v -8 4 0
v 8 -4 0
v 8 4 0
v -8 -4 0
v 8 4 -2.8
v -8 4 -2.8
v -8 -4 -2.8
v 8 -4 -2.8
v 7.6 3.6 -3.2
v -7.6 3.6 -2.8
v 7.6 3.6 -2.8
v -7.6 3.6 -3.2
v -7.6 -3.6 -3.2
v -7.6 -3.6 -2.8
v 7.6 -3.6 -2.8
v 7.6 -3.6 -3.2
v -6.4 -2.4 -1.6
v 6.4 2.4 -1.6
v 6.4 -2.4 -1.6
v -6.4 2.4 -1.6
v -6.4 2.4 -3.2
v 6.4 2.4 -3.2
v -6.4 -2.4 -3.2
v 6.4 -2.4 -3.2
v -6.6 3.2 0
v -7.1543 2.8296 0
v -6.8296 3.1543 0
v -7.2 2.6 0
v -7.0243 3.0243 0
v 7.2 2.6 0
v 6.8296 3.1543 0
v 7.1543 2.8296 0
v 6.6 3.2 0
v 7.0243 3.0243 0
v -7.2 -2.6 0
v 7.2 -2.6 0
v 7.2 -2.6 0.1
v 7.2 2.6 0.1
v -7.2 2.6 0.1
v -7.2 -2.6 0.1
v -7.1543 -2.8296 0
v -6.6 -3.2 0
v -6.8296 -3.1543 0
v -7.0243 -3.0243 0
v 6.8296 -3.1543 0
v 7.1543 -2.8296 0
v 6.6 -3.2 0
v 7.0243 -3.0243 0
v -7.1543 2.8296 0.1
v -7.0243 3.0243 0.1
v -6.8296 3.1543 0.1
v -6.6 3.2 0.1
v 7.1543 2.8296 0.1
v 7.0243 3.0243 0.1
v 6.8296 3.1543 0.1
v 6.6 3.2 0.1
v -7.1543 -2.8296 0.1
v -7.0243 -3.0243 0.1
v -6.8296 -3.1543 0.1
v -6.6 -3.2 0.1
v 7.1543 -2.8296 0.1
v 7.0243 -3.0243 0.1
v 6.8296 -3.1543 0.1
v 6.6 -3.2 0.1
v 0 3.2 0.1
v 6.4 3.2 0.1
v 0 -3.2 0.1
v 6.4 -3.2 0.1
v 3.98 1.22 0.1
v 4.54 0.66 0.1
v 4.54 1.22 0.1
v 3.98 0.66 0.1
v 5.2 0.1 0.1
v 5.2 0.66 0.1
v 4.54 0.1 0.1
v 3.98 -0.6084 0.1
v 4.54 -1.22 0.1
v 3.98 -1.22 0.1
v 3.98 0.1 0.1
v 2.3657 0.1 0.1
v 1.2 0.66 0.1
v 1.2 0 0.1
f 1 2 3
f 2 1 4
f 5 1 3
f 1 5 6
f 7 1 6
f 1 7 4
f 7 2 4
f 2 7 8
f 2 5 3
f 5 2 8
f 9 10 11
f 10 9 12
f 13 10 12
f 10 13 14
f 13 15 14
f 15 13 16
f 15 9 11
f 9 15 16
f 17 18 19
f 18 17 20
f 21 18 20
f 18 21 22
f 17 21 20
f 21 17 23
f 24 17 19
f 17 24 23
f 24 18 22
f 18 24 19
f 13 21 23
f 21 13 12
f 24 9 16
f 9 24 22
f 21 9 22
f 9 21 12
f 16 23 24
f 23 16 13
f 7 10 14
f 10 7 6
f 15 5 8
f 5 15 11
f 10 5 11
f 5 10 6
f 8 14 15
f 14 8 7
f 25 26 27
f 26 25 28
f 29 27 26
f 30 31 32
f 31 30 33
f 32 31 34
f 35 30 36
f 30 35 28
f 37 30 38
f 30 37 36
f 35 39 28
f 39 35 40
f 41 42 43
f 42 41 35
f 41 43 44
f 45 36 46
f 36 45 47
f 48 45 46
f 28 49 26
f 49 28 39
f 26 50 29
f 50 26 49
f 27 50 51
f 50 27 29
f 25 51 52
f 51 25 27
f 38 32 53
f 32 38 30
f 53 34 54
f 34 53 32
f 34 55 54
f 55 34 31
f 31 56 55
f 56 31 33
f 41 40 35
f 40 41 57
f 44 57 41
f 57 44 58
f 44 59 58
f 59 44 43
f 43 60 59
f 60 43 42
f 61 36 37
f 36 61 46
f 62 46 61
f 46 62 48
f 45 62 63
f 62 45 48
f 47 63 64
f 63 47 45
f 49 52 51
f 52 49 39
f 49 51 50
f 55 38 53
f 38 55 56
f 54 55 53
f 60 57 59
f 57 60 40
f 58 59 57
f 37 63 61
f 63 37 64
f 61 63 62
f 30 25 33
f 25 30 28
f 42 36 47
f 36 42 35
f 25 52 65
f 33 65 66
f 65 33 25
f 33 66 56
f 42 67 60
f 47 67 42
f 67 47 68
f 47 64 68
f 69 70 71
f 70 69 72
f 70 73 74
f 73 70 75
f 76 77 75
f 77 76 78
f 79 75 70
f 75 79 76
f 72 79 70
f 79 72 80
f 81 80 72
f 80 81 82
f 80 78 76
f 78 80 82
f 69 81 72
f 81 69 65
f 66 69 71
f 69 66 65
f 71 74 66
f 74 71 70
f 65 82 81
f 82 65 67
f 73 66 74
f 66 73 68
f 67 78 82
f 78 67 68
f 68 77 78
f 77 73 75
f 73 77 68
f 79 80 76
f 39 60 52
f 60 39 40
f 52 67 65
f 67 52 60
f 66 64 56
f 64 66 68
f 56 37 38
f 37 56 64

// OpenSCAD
// file: ../p/box5.scad
use <../lib.scad>
function ldraw_lib__box5() = [
// 0 Box with 5 Faces and All Edges
// 0 Name: box5.dat
// 0 Author: James Jessiman
// 0 !LDRAW_ORG Primitive UPDATE 2012-01
// 0 !LICENSE Licensed under CC BY 4.0 : see CAreadme.txt
// 
// 0 BFC CERTIFY CCW
  [0,"BFC","CERTIFY"],
  [0,"BFC","CCW"],
// 
// 0 !HISTORY 2002-04-03 [sbliss] Modified for BFC compliance
// 0 !HISTORY 2002-04-25 [PTadmin] Official Update 2002-02
// 0 !HISTORY 2007-06-24 [PTadmin] Header formatted for Contributor Agreement
// 0 !HISTORY 2008-07-01 [PTadmin] Official Update 2008-01
// 0 !HISTORY 2012-02-16 [Philo] Changed to CCW
// 0 !HISTORY 2012-03-30 [PTadmin] Official Update 2012-01
// 
// 
// 2 24 1 1 1 -1 1 1
  [2,24,1,1,1,-1,1,1],
// 2 24 -1 1 1 -1 1 -1
  [2,24,-1,1,1,-1,1,-1],
// 2 24 -1 1 -1 1 1 -1
  [2,24,-1,1,-1,1,1,-1],
// 2 24 1 1 -1 1 1 1
  [2,24,1,1,-1,1,1,1],
// 2 24 1 0 1 -1 0 1
  [2,24,1,0,1,-1,0,1],
// 2 24 -1 0 1 -1 0 -1
  [2,24,-1,0,1,-1,0,-1],
// 2 24 -1 0 -1 1 0 -1
  [2,24,-1,0,-1,1,0,-1],
// 2 24 1 0 -1 1 0 1
  [2,24,1,0,-1,1,0,1],
// 2 24 1 0 1 1 1 1
  [2,24,1,0,1,1,1,1],
// 2 24 -1 0 1 -1 1 1
  [2,24,-1,0,1,-1,1,1],
// 2 24 1 0 -1 1 1 -1
  [2,24,1,0,-1,1,1,-1],
// 2 24 -1 0 -1 -1 1 -1
  [2,24,-1,0,-1,-1,1,-1],
// 4 16 -1 1 1 1 1 1 1 1 -1 -1 1 -1
  [4,16,-1,1,1,1,1,1,1,1,-1,-1,1,-1],
// 4 16 -1 1 1 -1 0 1 1 0 1 1 1 1
  [4,16,-1,1,1,-1,0,1,1,0,1,1,1,1],
// 4 16 -1 1 -1 -1 0 -1 -1 0 1 -1 1 1
  [4,16,-1,1,-1,-1,0,-1,-1,0,1,-1,1,1],
// 4 16 1 1 -1 1 0 -1 -1 0 -1 -1 1 -1
  [4,16,1,1,-1,1,0,-1,-1,0,-1,-1,1,-1],
// 4 16 1 1 1 1 0 1 1 0 -1 1 1 -1
  [4,16,1,1,1,1,0,1,1,0,-1,1,1,-1],
];
module ldraw_lib__box5(step=0, col=false, unit=2/5, alt=false, line=0.2, solid=!$preview)
    makepoly(ldraw_lib__box5(), step=step, col=col, unit=unit, alt=alt, line=line, solid=solid);
ldraw_lib__box5(line=0.2);
// file: ../p/box4.scad
use <../lib.scad>
function ldraw_lib__box4() = [
// 0 Box with 4 Faces (2 Parallel Pairs) and All Edges
// 0 Name: box4.dat
// 0 Author: James Jessiman
// 0 !LDRAW_ORG Primitive UPDATE 2012-01
// 0 !LICENSE Licensed under CC BY 4.0 : see CAreadme.txt
// 
// 0 BFC CERTIFY CCW
  [0,"BFC","CERTIFY"],
  [0,"BFC","CCW"],
// 
// 0 !HISTORY 2002-04-03 [sbliss] Modified for BFC compliance
// 0 !HISTORY 2002-04-25 [PTadmin] Official Update 2002-02
// 0 !HISTORY 2007-06-24 [PTadmin] Header formatted for Contributor Agreement
// 0 !HISTORY 2008-07-01 [PTadmin] Official Update 2008-01
// 0 !HISTORY 2012-02-16 [Philo] Changed to CCW
// 0 !HISTORY 2012-03-30 [PTadmin] Official Update 2012-01
// 
// 
// 2 24 1 1 1 -1 1 1
  [2,24,1,1,1,-1,1,1],
// 2 24 -1 1 1 -1 1 -1
  [2,24,-1,1,1,-1,1,-1],
// 2 24 -1 1 -1 1 1 -1
  [2,24,-1,1,-1,1,1,-1],
// 2 24 1 1 -1 1 1 1
  [2,24,1,1,-1,1,1,1],
// 2 24 1 0 1 -1 0 1
  [2,24,1,0,1,-1,0,1],
// 2 24 -1 0 1 -1 0 -1
  [2,24,-1,0,1,-1,0,-1],
// 2 24 -1 0 -1 1 0 -1
  [2,24,-1,0,-1,1,0,-1],
// 2 24 1 0 -1 1 0 1
  [2,24,1,0,-1,1,0,1],
// 2 24 1 0 1 1 1 1
  [2,24,1,0,1,1,1,1],
// 2 24 -1 0 1 -1 1 1
  [2,24,-1,0,1,-1,1,1],
// 2 24 1 0 -1 1 1 -1
  [2,24,1,0,-1,1,1,-1],
// 2 24 -1 0 -1 -1 1 -1
  [2,24,-1,0,-1,-1,1,-1],
// 4 16 -1 1 1 -1 0 1 1 0 1 1 1 1
  [4,16,-1,1,1,-1,0,1,1,0,1,1,1,1],
// 4 16 -1 1 -1 -1 0 -1 -1 0 1 -1 1 1
  [4,16,-1,1,-1,-1,0,-1,-1,0,1,-1,1,1],
// 4 16 1 1 -1 1 0 -1 -1 0 -1 -1 1 -1
  [4,16,1,1,-1,1,0,-1,-1,0,-1,-1,1,-1],
// 4 16 1 1 1 1 0 1 1 0 -1 1 1 -1
  [4,16,1,1,1,1,0,1,1,0,-1,1,1,-1],
];
module ldraw_lib__box4(step=0, col=false, unit=2/5, alt=false, line=0.2, solid=!$preview)
    makepoly(ldraw_lib__box4(), step=step, col=col, unit=unit, alt=alt, line=line, solid=solid);
ldraw_lib__box4(line=0.2);
// file: ../p/box3u12.scad
use <../lib.scad>
function ldraw_lib__box3u12() = [
// 0 Box with 3 Parallel Faces without Any Edges
// 0 Name: box3u12.dat
// 0 Author: J.C. Tchang [tchang]
// 0 !LDRAW_ORG Primitive UPDATE 2014-02
// 0 !LICENSE Licensed under CC BY 4.0 : see CAreadme.txt
// 
// 0 BFC CERTIFY CCW
  [0,"BFC","CERTIFY"],
  [0,"BFC","CCW"],
// 
// 0 !HISTORY 2014-12-23 [PTadmin] Official Update 2014-02
// 
// 
// 4 16 -1 1 1 1 1 1 1 1 -1 -1 1 -1
  [4,16,-1,1,1,1,1,1,1,1,-1,-1,1,-1],
// 4 16 -1 1 1 -1 0 1 1 0 1 1 1 1
  [4,16,-1,1,1,-1,0,1,1,0,1,1,1,1],
// 4 16 1 1 -1 1 0 -1 -1 0 -1 -1 1 -1
  [4,16,1,1,-1,1,0,-1,-1,0,-1,-1,1,-1],
];
module ldraw_lib__box3u12(step=0, col=false, unit=2/5, alt=false, line=0.2, solid=!$preview)
    makepoly(ldraw_lib__box3u12(), step=step, col=col, unit=unit, alt=alt, line=line, solid=solid);
ldraw_lib__box3u12(line=0.2);
// file: ../p/1-4cyli.scad
use <../lib.scad>
function ldraw_lib__1_4cyli() = [
// 0 Cylinder 0.25
// 0 Name: 1-4cyli.dat
// 0 Author: James Jessiman
// 0 !LDRAW_ORG Primitive UPDATE 2012-01
// 0 !LICENSE Licensed under CC BY 4.0 : see CAreadme.txt
// 
// 0 BFC CERTIFY CCW
  [0,"BFC","CERTIFY"],
  [0,"BFC","CCW"],
// 
// 0 !HISTORY 2002-03-23 [sbliss] Added BFC statement.
// 0 !HISTORY 2002-04-25 [PTadmin] Official Update 2002-02
// 0 !HISTORY 2007-06-22 [PTadmin] Header formatted for Contributor Agreement
// 0 !HISTORY 2008-07-01 [PTadmin] Official Update 2008-01
// 0 !HISTORY 2012-02-16 [Philo] Changed to CCW
// 0 !HISTORY 2012-03-30 [PTadmin] Official Update 2012-01
// 
// 
// 4 16 1 1 0 0.9239 1 0.3827 0.9239 0 0.3827 1 0 0
  [4,16,1,1,0,0.9239,1,0.3827,0.9239,0,0.3827,1,0,0],
// 5 24 1 0 0 1 1 0 0.9239 0 0.3827 1 0 -1
  [5,24,1,0,0,1,1,0,0.9239,0,0.3827,1,0,-1],
// 4 16 0.9239 1 0.3827 0.7071 1 0.7071 0.7071 0 0.7071 0.9239 0 0.3827
  [4,16,0.9239,1,0.3827,0.7071,1,0.7071,0.7071,0,0.7071,0.9239,0,0.3827],
// 5 24 0.9239 0 0.3827 0.9239 1 0.3827 0.7071 0 0.7071 1 0 0
  [5,24,0.9239,0,0.3827,0.9239,1,0.3827,0.7071,0,0.7071,1,0,0],
// 4 16 0.7071 1 0.7071 0.3827 1 0.9239 0.3827 0 0.9239 0.7071 0 0.7071
  [4,16,0.7071,1,0.7071,0.3827,1,0.9239,0.3827,0,0.9239,0.7071,0,0.7071],
// 5 24 0.7071 0 0.7071 0.7071 1 0.7071 0.3827 0 0.9239 0.9239 0 0.3827
  [5,24,0.7071,0,0.7071,0.7071,1,0.7071,0.3827,0,0.9239,0.9239,0,0.3827],
// 4 16 0.3827 1 0.9239 0 1 1 0 0 1 0.3827 0 0.9239
  [4,16,0.3827,1,0.9239,0,1,1,0,0,1,0.3827,0,0.9239],
// 5 24 0.3827 0 0.9239 0.3827 1 0.9239 0 0 1 0.7071 0 0.7071
  [5,24,0.3827,0,0.9239,0.3827,1,0.9239,0,0,1,0.7071,0,0.7071],
// 5 24 0 0 1 0 1 1 0.3827 0 0.9239 -1 0 1
  [5,24,0,0,1,0,1,1,0.3827,0,0.9239,-1,0,1],
];
module ldraw_lib__1_4cyli(step=0, col=false, unit=2/5, alt=false, line=0.2, solid=!$preview)
    makepoly(ldraw_lib__1_4cyli(), step=step, col=col, unit=unit, alt=alt, line=line, solid=solid);
ldraw_lib__1_4cyli(line=0.2);
// file: ../p/1-4chrd.scad
use <../lib.scad>
function ldraw_lib__1_4chrd() = [
// 0 Chord 0.25
// 0 Name: 1-4chrd.dat
// 0 Author: Max Martin Richter [MMR1988]
// 0 !LDRAW_ORG Primitive UPDATE 2023-05
// 0 !LICENSE Licensed under CC BY 4.0 : see CAreadme.txt
// 
// 0 BFC CERTIFY CCW
  [0,"BFC","CERTIFY"],
  [0,"BFC","CCW"],
// 
// 0 !HISTORY 2004-04-22 [PTadmin] Official Update 2004-02
// 0 !HISTORY 2007-10-09 [PTadmin] Header formatted for Contributor Agreement
// 0 !HISTORY 2008-07-01 [PTadmin] Official Update 2008-01
// 0 !HISTORY 2012-08-02 [MMR1988] Re-creation with PrimGen2 and Rectifier
// 0 !HISTORY 2012-08-09 [PTadmin] Official Update 2012-02
// 0 !HISTORY 2023-10-27 [OrionP] Change author to MMR1988 from hafhead
// 0 !HISTORY 2023-10-31 [OrionP] Official Update 2023-05
// 
// 4 16 0.9239 0 0.3827 0.3827 0 0.9239 0 0 1 1 0 0
  [4,16,0.9239,0,0.3827,0.3827,0,0.9239,0,0,1,1,0,0],
// 3 16 0.7071 0 0.7071 0.3827 0 0.9239 0.9239 0 0.3827
  [3,16,0.7071,0,0.7071,0.3827,0,0.9239,0.9239,0,0.3827],
];
module ldraw_lib__1_4chrd(step=0, col=false, unit=2/5, alt=false, line=0.2, solid=!$preview)
    makepoly(ldraw_lib__1_4chrd(), step=step, col=col, unit=unit, alt=alt, line=line, solid=solid);
ldraw_lib__1_4chrd(line=0.2);
// file: s/3069bs01.scad
use <../../lib.scad>
use <../../p/box4.scad>
use <../../p/box5.scad>
function ldraw_lib__s__3069bs01() = [
// 0 ~Tile  1 x  2 with Groove without Top Face
// 0 Name: s\3069bs01.dat
// 0 Author: Santeri Piippo [arezey]
// 0 !LDRAW_ORG Subpart UPDATE 2010-02
// 0 !LICENSE Licensed under CC BY 4.0 : see CAreadme.txt
// 
// 0 BFC CERTIFY CCW
  [0,"BFC","CERTIFY"],
  [0,"BFC","CCW"],
// 
// 0 !HISTORY 2010-07-05 [PTadmin] Official Update 2010-02
// 
// 
// 1 16 0 0 0 20 0 0 0 7 0 0 0 10 box4.dat
  [1,16,0,0,0,20,0,0,0,7,0,0,0,10, ldraw_lib__box4()],
// 1 16 0 7 0 19 0 0 0 1 0 0 0 9 box4.dat
  [1,16,0,7,0,19,0,0,0,1,0,0,0,9, ldraw_lib__box4()],
// 0 BFC INVERTNEXT
  [0,"BFC","INVERTNEXT"],
// 1 16 0 8 0 16 0 0 0 -4 0 0 0 6 box5.dat
  [1,16,0,8,0,16,0,0,0,-4,0,0,0,6, ldraw_lib__box5()],
// 4 16 -19 8 9 -16 8 6 -16 8 -6 -19 8 -9
  [4,16,-19,8,9,-16,8,6,-16,8,-6,-19,8,-9],
// 4 16 19 8 -9 16 8 -6 16 8 6 19 8 9
  [4,16,19,8,-9,16,8,-6,16,8,6,19,8,9],
// 4 16 19 8 9 16 8 6 -16 8 6 -19 8 9
  [4,16,19,8,9,16,8,6,-16,8,6,-19,8,9],
// 4 16 -19 8 -9 -16 8 -6 16 8 -6 19 8 -9
  [4,16,-19,8,-9,-16,8,-6,16,8,-6,19,8,-9],
// 4 16 -20 7 10 -19 7 9 -19 7 -9 -20 7 -10
  [4,16,-20,7,10,-19,7,9,-19,7,-9,-20,7,-10],
// 4 16 20 7 -10 19 7 -9 19 7 9 20 7 10
  [4,16,20,7,-10,19,7,-9,19,7,9,20,7,10],
// 4 16 20 7 10 19 7 9 -19 7 9 -20 7 10
  [4,16,20,7,10,19,7,9,-19,7,9,-20,7,10],
// 4 16 -20 7 -10 -19 7 -9 19 7 -9 20 7 -10
  [4,16,-20,7,-10,-19,7,-9,19,7,-9,20,7,-10],
// 0 //
];
module ldraw_lib__s__3069bs01(step=0, col=false, unit=2/5, alt=false, line=0.2, solid=!$preview)
    makepoly(ldraw_lib__s__3069bs01(), step=step, col=col, unit=unit, alt=alt, line=line, solid=solid);
ldraw_lib__s__3069bs01(line=0.2);
// file: 6142271o.scad
use <../lib.scad>
use <../p/1-4chrd.scad>
use <../p/1-4cyli.scad>
use <../p/box3u12.scad>
function ldraw_lib__6142271o() = [
// 0 Sticker  1.8 x  .8 with Black 4 on White Stripe on Blue Background
// 0 Name: 6142271o.dat
// 0 Author: Massimo Maso [Sirio]
// 0 !LDRAW_ORG Part UPDATE 2025-02
// 0 !LICENSE Licensed under CC BY 4.0 : see CAreadme.txt
// 
// 0 BFC CERTIFY CCW
  [0,"BFC","CERTIFY"],
  [0,"BFC","CCW"],
// 
// 0 !KEYWORDS Audi, Bricklink 75873stk01a, Brickowl 427960, LMS, R8
// 0 !KEYWORDS Rebrickable 24755, Set 75873, Speed Champions, Ultra
// 
// 0 !HISTORY 2025-02-27 [OrionP] Official Update 2025-02
// 
// 
// 0 // Primitives
// 1 16 6.5 0 16.5 0 0 1.5 0 -1 0 1.5 0 0 1-4chrd.dat
  [1,16,6.5,0,16.5,0,0,1.5,0,-1,0,1.5,0,0, ldraw_lib__1_4chrd()],
// 1 16 6.5 0 -16.5 0 0 1.5 0 -1 0 -1.5 0 0 1-4chrd.dat
  [1,16,6.5,0,-16.5,0,0,1.5,0,-1,0,-1.5,0,0, ldraw_lib__1_4chrd()],
// 1 16 0 -.25 0 6.5 0 0 0 .25 0 0 0 -18 box3u12.dat
  [1,16,0,-.25,0,6.5,0,0,0,.25,0,0,0,-18, ldraw_lib__box3u12()],
// 1 16 -6.5 0 16.5 0 0 -1.5 0 -1 0 1.5 0 0 1-4chrd.dat
  [1,16,-6.5,0,16.5,0,0,-1.5,0,-1,0,1.5,0,0, ldraw_lib__1_4chrd()],
// 1 16 -6.5 0 -16.5 0 0 -1.5 0 -1 0 -1.5 0 0 1-4chrd.dat
  [1,16,-6.5,0,-16.5,0,0,-1.5,0,-1,0,-1.5,0,0, ldraw_lib__1_4chrd()],
// 1 16 6.5 0 16.5 0 0 1.5 0 -.25 0 1.5 0 0 1-4cyli.dat
  [1,16,6.5,0,16.5,0,0,1.5,0,-.25,0,1.5,0,0, ldraw_lib__1_4cyli()],
// 1 16 6.5 0 -16.5 0 0 1.5 0 -.25 0 -1.5 0 0 1-4cyli.dat
  [1,16,6.5,0,-16.5,0,0,1.5,0,-.25,0,-1.5,0,0, ldraw_lib__1_4cyli()],
// 1 16 -6.5 0 16.5 0 0 -1.5 0 -.25 0 1.5 0 0 1-4cyli.dat
  [1,16,-6.5,0,16.5,0,0,-1.5,0,-.25,0,1.5,0,0, ldraw_lib__1_4cyli()],
// 1 16 -6.5 0 -16.5 0 0 -1.5 0 -.25 0 -1.5 0 0 1-4cyli.dat
  [1,16,-6.5,0,-16.5,0,0,-1.5,0,-.25,0,-1.5,0,0, ldraw_lib__1_4cyli()],
// 1 1 6.5 -.25 16.5 0 0 1.5 0 1 0 1.5 0 0 1-4chrd.dat
  [1,1,6.5,-.25,16.5,0,0,1.5,0,1,0,1.5,0,0, ldraw_lib__1_4chrd()],
// 1 1 6.5 -.25 -16.5 0 0 1.5 0 1 0 -1.5 0 0 1-4chrd.dat
  [1,1,6.5,-.25,-16.5,0,0,1.5,0,1,0,-1.5,0,0, ldraw_lib__1_4chrd()],
// 1 1 -6.5 -.25 16.5 0 0 -1.5 0 1 0 1.5 0 0 1-4chrd.dat
  [1,1,-6.5,-.25,16.5,0,0,-1.5,0,1,0,1.5,0,0, ldraw_lib__1_4chrd()],
// 1 1 -6.5 -.25 -16.5 0 0 -1.5 0 1 0 -1.5 0 0 1-4chrd.dat
  [1,1,-6.5,-.25,-16.5,0,0,-1.5,0,1,0,-1.5,0,0, ldraw_lib__1_4chrd()],
// 0 // Bottom faces
// 4 16 8 0 -16.5 6.5 0 -18 6.5 0 18 8 0 16.5
  [4,16,8,0,-16.5,6.5,0,-18,6.5,0,18,8,0,16.5],
// 4 16 -8 0 -16.5 -8 0 16.5 -6.5 0 18 -6.5 0 -18
  [4,16,-8,0,-16.5,-8,0,16.5,-6.5,0,18,-6.5,0,-18],
// 0 // Lateral faces
// 3 16 8 0 16.5 8 -.25 16.5 8 -.25 0
  [3,16,8,0,16.5,8,-.25,16.5,8,-.25,0],
// 4 16 8 0 16.5 8 -.25 0 8 -.25 -16 8 0 -16.5
  [4,16,8,0,16.5,8,-.25,0,8,-.25,-16,8,0,-16.5],
// 3 16 8 0 -16.5 8 -.25 -16 8 -.25 -16.5
  [3,16,8,0,-16.5,8,-.25,-16,8,-.25,-16.5],
// 3 16 -8 0 16.5 -8 -.25 0 -8 -.25 16.5
  [3,16,-8,0,16.5,-8,-.25,0,-8,-.25,16.5],
// 4 16 -8 0 16.5 -8 0 -16.5 -8 -.25 -16 -8 -.25 0
  [4,16,-8,0,16.5,-8,0,-16.5,-8,-.25,-16,-8,-.25,0],
// 3 16 -8 0 -16.5 -8 -.25 -16.5 -8 -.25 -16
  [3,16,-8,0,-16.5,-8,-.25,-16.5,-8,-.25,-16],
// 0 // Black number 4
// 4 0 3.05 -.25 -9.95 1.65 -.25 -9.95 1.65 -.25 -11.35 3.05 -.25 -11.35
  [4,0,3.05,-.25,-9.95,1.65,-.25,-9.95,1.65,-.25,-11.35,3.05,-.25,-11.35],
// 4 0 1.65 -.25 -11.35 .25 -.25 -11.35 .25 -.25 -13 1.65 -.25 -13
  [4,0,1.65,-.25,-11.35,.25,-.25,-11.35,.25,-.25,-13,1.65,-.25,-13],
// 4 0 .25 -.25 -11.35 -1.5211 -.25 -9.95 -3.05 -.25 -9.95 -3.05 -.25 -11.35
  [4,0,.25,-.25,-11.35,-1.5211,-.25,-9.95,-3.05,-.25,-9.95,-3.05,-.25,-11.35],
// 4 0 1.65 -.25 -11.35 .25 -.25 -9.95 -1.5211 -.25 -9.95 .25 -.25 -11.35
  [4,0,1.65,-.25,-11.35,.25,-.25,-9.95,-1.5211,-.25,-9.95,.25,-.25,-11.35],
// 4 0 1.65 -.25 -9.95 .25 -.25 -5.9142 .25 -.25 -9.95 1.65 -.25 -11.35
  [4,0,1.65,-.25,-9.95,.25,-.25,-5.9142,.25,-.25,-9.95,1.65,-.25,-11.35],
// 4 0 1.65 -.25 -9.95 1.65 -.25 -3 0 -.25 -3 .25 -.25 -5.9142
  [4,0,1.65,-.25,-9.95,1.65,-.25,-3,0,-.25,-3,.25,-.25,-5.9142],
// 4 0 .25 -.25 -5.9142 0 -.25 -3 -3.05 -.25 -9.95 -1.5211 -.25 -9.95
  [4,0,.25,-.25,-5.9142,0,-.25,-3,-3.05,-.25,-9.95,-1.5211,-.25,-9.95],
// 0 // White top faces
// 4 15 8 -.25 0 1.65 -.25 -3 1.65 -.25 -9.95 3.05 -.25 -9.95
  [4,15,8,-.25,0,1.65,-.25,-3,1.65,-.25,-9.95,3.05,-.25,-9.95],
// 4 15 8 -.25 0 3.05 -.25 -9.95 3.05 -.25 -11.35 8 -.25 -16
  [4,15,8,-.25,0,3.05,-.25,-9.95,3.05,-.25,-11.35,8,-.25,-16],
// 4 15 8 -.25 -16 3.05 -.25 -11.35 1.65 -.25 -11.35 1.65 -.25 -13
  [4,15,8,-.25,-16,3.05,-.25,-11.35,1.65,-.25,-11.35,1.65,-.25,-13],
// 4 15 8 -.25 0 -8 -.25 0 0 -.25 -3 1.65 -.25 -3
  [4,15,8,-.25,0,-8,-.25,0,0,-.25,-3,1.65,-.25,-3],
// 4 15 8 -.25 -16 1.65 -.25 -13 .25 -.25 -13 -8 -.25 -16
  [4,15,8,-.25,-16,1.65,-.25,-13,.25,-.25,-13,-8,-.25,-16],
// 4 15 -8 -.25 0 -8 -.25 -16 -3.05 -.25 -9.95 0 -.25 -3
  [4,15,-8,-.25,0,-8,-.25,-16,-3.05,-.25,-9.95,0,-.25,-3],
// 3 15 -8 -.25 -16 -3.05 -.25 -11.35 -3.05 -.25 -9.95
  [3,15,-8,-.25,-16,-3.05,-.25,-11.35,-3.05,-.25,-9.95],
// 4 15 -8 -.25 -16 .25 -.25 -13 .25 -.25 -11.35 -3.05 -.25 -11.35
  [4,15,-8,-.25,-16,.25,-.25,-13,.25,-.25,-11.35,-3.05,-.25,-11.35],
// 3 15 .25 -.25 -9.95 .25 -.25 -5.9142 -1.5211 -.25 -9.95
  [3,15,.25,-.25,-9.95,.25,-.25,-5.9142,-1.5211,-.25,-9.95],
// 0 // Blue top faces
// 4 1 8 -.25 16.5 6.5 -.25 18 -6.5 -.25 18 -8 -.25 16.5
  [4,1,8,-.25,16.5,6.5,-.25,18,-6.5,-.25,18,-8,-.25,16.5],
// 4 1 8 -.25 16.5 -8 -.25 16.5 -8 -.25 0 8 -.25 0
  [4,1,8,-.25,16.5,-8,-.25,16.5,-8,-.25,0,8,-.25,0],
// 4 1 8 -.25 -16 -8 -.25 -16 -8 -.25 -16.5 8 -.25 -16.5
  [4,1,8,-.25,-16,-8,-.25,-16,-8,-.25,-16.5,8,-.25,-16.5],
// 4 1 8 -.25 -16.5 -8 -.25 -16.5 -6.5 -.25 -18 6.5 -.25 -18
  [4,1,8,-.25,-16.5,-8,-.25,-16.5,-6.5,-.25,-18,6.5,-.25,-18],
];
module ldraw_lib__6142271o(step=0, col=false, unit=2/5, alt=false, line=0.2, solid=!$preview)
    makepoly(ldraw_lib__6142271o(), step=step, col=col, unit=unit, alt=alt, line=line, solid=solid);
ldraw_lib__6142271o(line=0.2);
// file: 3069b.scad
use <../lib.scad>
use <s/3069bs01.scad>
function ldraw_lib__3069b() = [
// 0 Tile  1 x  2 with Groove
// 0 Name: 3069b.dat
// 0 Author: Santeri Piippo [arezey]
// 0 !LDRAW_ORG Part UPDATE 2010-02
// 0 !LICENSE Licensed under CC BY 4.0 : see CAreadme.txt
// 
// 0 BFC CERTIFY CCW
  [0,"BFC","CERTIFY"],
  [0,"BFC","CCW"],
// 
// 0 !HISTORY 2010-07-05 [PTadmin] Official Update 2010-02
// 
// 
// 4 16 20 0 -10 20 0 10 -20 0 10 -20 0 -10
  [4,16,20,0,-10,20,0,10,-20,0,10,-20,0,-10],
// 1 16 0 0 0 1 0 0 0 1 0 0 0 1 s\3069bs01.dat
  [1,16,0,0,0,1,0,0,0,1,0,0,0,1, ldraw_lib__s__3069bs01()],
// 0 //
];
module ldraw_lib__3069b(step=0, col=false, unit=2/5, alt=false, line=0.2, solid=!$preview)
    makepoly(ldraw_lib__3069b(), step=step, col=col, unit=unit, alt=alt, line=line, solid=solid);
ldraw_lib__3069b(line=0.2);
// main file
use <../lib.scad>
use <3069b.scad>
use <6142271o.scad>
function ldraw_lib__3069bd1k() = [
// 0 Tile  1 x  2 with Black 4 on White Stripe on Blue Background Sticker
// 0 Name: 3069bd1k.dat
// 0 Author: Vincent Messenet [Cheenzo]
// 0 !LDRAW_ORG Shortcut UPDATE 2025-03
// 0 !LICENSE Licensed under CC BY 4.0 : see CAreadme.txt
// 
// 0 BFC CERTIFY CCW
  [0,"BFC","CERTIFY"],
  [0,"BFC","CCW"],
// 
// 0 !CATEGORY Sticker Shortcut
// 0 !KEYWORDS Audi R8 LMS ultra, Bricklink 3069pb0646, Set 75873
// 
// 0 !HISTORY 2025-03-30 [OrionP] Official Update 2025-03
// 
// 1 16 0 0 0 1 0 0 0 1 0 0 0 1 3069b.dat
  [1,16,0,0,0,1,0,0,0,1,0,0,0,1, ldraw_lib__3069b()],
// 1 16 0 0 0 0 0 -1 0 1 0 1 0 0 6142271o.dat
  [1,16,0,0,0,0,0,-1,0,1,0,1,0,0, ldraw_lib__6142271o()],
];
module ldraw_lib__3069bd1k(step=0, col=false, unit=2/5, alt=false, line=0.2, solid=!$preview)
    makepoly(ldraw_lib__3069bd1k(), step=step, col=col, unit=unit, alt=alt, line=line, solid=solid);
ldraw_lib__3069bd1k(line=0.2);
